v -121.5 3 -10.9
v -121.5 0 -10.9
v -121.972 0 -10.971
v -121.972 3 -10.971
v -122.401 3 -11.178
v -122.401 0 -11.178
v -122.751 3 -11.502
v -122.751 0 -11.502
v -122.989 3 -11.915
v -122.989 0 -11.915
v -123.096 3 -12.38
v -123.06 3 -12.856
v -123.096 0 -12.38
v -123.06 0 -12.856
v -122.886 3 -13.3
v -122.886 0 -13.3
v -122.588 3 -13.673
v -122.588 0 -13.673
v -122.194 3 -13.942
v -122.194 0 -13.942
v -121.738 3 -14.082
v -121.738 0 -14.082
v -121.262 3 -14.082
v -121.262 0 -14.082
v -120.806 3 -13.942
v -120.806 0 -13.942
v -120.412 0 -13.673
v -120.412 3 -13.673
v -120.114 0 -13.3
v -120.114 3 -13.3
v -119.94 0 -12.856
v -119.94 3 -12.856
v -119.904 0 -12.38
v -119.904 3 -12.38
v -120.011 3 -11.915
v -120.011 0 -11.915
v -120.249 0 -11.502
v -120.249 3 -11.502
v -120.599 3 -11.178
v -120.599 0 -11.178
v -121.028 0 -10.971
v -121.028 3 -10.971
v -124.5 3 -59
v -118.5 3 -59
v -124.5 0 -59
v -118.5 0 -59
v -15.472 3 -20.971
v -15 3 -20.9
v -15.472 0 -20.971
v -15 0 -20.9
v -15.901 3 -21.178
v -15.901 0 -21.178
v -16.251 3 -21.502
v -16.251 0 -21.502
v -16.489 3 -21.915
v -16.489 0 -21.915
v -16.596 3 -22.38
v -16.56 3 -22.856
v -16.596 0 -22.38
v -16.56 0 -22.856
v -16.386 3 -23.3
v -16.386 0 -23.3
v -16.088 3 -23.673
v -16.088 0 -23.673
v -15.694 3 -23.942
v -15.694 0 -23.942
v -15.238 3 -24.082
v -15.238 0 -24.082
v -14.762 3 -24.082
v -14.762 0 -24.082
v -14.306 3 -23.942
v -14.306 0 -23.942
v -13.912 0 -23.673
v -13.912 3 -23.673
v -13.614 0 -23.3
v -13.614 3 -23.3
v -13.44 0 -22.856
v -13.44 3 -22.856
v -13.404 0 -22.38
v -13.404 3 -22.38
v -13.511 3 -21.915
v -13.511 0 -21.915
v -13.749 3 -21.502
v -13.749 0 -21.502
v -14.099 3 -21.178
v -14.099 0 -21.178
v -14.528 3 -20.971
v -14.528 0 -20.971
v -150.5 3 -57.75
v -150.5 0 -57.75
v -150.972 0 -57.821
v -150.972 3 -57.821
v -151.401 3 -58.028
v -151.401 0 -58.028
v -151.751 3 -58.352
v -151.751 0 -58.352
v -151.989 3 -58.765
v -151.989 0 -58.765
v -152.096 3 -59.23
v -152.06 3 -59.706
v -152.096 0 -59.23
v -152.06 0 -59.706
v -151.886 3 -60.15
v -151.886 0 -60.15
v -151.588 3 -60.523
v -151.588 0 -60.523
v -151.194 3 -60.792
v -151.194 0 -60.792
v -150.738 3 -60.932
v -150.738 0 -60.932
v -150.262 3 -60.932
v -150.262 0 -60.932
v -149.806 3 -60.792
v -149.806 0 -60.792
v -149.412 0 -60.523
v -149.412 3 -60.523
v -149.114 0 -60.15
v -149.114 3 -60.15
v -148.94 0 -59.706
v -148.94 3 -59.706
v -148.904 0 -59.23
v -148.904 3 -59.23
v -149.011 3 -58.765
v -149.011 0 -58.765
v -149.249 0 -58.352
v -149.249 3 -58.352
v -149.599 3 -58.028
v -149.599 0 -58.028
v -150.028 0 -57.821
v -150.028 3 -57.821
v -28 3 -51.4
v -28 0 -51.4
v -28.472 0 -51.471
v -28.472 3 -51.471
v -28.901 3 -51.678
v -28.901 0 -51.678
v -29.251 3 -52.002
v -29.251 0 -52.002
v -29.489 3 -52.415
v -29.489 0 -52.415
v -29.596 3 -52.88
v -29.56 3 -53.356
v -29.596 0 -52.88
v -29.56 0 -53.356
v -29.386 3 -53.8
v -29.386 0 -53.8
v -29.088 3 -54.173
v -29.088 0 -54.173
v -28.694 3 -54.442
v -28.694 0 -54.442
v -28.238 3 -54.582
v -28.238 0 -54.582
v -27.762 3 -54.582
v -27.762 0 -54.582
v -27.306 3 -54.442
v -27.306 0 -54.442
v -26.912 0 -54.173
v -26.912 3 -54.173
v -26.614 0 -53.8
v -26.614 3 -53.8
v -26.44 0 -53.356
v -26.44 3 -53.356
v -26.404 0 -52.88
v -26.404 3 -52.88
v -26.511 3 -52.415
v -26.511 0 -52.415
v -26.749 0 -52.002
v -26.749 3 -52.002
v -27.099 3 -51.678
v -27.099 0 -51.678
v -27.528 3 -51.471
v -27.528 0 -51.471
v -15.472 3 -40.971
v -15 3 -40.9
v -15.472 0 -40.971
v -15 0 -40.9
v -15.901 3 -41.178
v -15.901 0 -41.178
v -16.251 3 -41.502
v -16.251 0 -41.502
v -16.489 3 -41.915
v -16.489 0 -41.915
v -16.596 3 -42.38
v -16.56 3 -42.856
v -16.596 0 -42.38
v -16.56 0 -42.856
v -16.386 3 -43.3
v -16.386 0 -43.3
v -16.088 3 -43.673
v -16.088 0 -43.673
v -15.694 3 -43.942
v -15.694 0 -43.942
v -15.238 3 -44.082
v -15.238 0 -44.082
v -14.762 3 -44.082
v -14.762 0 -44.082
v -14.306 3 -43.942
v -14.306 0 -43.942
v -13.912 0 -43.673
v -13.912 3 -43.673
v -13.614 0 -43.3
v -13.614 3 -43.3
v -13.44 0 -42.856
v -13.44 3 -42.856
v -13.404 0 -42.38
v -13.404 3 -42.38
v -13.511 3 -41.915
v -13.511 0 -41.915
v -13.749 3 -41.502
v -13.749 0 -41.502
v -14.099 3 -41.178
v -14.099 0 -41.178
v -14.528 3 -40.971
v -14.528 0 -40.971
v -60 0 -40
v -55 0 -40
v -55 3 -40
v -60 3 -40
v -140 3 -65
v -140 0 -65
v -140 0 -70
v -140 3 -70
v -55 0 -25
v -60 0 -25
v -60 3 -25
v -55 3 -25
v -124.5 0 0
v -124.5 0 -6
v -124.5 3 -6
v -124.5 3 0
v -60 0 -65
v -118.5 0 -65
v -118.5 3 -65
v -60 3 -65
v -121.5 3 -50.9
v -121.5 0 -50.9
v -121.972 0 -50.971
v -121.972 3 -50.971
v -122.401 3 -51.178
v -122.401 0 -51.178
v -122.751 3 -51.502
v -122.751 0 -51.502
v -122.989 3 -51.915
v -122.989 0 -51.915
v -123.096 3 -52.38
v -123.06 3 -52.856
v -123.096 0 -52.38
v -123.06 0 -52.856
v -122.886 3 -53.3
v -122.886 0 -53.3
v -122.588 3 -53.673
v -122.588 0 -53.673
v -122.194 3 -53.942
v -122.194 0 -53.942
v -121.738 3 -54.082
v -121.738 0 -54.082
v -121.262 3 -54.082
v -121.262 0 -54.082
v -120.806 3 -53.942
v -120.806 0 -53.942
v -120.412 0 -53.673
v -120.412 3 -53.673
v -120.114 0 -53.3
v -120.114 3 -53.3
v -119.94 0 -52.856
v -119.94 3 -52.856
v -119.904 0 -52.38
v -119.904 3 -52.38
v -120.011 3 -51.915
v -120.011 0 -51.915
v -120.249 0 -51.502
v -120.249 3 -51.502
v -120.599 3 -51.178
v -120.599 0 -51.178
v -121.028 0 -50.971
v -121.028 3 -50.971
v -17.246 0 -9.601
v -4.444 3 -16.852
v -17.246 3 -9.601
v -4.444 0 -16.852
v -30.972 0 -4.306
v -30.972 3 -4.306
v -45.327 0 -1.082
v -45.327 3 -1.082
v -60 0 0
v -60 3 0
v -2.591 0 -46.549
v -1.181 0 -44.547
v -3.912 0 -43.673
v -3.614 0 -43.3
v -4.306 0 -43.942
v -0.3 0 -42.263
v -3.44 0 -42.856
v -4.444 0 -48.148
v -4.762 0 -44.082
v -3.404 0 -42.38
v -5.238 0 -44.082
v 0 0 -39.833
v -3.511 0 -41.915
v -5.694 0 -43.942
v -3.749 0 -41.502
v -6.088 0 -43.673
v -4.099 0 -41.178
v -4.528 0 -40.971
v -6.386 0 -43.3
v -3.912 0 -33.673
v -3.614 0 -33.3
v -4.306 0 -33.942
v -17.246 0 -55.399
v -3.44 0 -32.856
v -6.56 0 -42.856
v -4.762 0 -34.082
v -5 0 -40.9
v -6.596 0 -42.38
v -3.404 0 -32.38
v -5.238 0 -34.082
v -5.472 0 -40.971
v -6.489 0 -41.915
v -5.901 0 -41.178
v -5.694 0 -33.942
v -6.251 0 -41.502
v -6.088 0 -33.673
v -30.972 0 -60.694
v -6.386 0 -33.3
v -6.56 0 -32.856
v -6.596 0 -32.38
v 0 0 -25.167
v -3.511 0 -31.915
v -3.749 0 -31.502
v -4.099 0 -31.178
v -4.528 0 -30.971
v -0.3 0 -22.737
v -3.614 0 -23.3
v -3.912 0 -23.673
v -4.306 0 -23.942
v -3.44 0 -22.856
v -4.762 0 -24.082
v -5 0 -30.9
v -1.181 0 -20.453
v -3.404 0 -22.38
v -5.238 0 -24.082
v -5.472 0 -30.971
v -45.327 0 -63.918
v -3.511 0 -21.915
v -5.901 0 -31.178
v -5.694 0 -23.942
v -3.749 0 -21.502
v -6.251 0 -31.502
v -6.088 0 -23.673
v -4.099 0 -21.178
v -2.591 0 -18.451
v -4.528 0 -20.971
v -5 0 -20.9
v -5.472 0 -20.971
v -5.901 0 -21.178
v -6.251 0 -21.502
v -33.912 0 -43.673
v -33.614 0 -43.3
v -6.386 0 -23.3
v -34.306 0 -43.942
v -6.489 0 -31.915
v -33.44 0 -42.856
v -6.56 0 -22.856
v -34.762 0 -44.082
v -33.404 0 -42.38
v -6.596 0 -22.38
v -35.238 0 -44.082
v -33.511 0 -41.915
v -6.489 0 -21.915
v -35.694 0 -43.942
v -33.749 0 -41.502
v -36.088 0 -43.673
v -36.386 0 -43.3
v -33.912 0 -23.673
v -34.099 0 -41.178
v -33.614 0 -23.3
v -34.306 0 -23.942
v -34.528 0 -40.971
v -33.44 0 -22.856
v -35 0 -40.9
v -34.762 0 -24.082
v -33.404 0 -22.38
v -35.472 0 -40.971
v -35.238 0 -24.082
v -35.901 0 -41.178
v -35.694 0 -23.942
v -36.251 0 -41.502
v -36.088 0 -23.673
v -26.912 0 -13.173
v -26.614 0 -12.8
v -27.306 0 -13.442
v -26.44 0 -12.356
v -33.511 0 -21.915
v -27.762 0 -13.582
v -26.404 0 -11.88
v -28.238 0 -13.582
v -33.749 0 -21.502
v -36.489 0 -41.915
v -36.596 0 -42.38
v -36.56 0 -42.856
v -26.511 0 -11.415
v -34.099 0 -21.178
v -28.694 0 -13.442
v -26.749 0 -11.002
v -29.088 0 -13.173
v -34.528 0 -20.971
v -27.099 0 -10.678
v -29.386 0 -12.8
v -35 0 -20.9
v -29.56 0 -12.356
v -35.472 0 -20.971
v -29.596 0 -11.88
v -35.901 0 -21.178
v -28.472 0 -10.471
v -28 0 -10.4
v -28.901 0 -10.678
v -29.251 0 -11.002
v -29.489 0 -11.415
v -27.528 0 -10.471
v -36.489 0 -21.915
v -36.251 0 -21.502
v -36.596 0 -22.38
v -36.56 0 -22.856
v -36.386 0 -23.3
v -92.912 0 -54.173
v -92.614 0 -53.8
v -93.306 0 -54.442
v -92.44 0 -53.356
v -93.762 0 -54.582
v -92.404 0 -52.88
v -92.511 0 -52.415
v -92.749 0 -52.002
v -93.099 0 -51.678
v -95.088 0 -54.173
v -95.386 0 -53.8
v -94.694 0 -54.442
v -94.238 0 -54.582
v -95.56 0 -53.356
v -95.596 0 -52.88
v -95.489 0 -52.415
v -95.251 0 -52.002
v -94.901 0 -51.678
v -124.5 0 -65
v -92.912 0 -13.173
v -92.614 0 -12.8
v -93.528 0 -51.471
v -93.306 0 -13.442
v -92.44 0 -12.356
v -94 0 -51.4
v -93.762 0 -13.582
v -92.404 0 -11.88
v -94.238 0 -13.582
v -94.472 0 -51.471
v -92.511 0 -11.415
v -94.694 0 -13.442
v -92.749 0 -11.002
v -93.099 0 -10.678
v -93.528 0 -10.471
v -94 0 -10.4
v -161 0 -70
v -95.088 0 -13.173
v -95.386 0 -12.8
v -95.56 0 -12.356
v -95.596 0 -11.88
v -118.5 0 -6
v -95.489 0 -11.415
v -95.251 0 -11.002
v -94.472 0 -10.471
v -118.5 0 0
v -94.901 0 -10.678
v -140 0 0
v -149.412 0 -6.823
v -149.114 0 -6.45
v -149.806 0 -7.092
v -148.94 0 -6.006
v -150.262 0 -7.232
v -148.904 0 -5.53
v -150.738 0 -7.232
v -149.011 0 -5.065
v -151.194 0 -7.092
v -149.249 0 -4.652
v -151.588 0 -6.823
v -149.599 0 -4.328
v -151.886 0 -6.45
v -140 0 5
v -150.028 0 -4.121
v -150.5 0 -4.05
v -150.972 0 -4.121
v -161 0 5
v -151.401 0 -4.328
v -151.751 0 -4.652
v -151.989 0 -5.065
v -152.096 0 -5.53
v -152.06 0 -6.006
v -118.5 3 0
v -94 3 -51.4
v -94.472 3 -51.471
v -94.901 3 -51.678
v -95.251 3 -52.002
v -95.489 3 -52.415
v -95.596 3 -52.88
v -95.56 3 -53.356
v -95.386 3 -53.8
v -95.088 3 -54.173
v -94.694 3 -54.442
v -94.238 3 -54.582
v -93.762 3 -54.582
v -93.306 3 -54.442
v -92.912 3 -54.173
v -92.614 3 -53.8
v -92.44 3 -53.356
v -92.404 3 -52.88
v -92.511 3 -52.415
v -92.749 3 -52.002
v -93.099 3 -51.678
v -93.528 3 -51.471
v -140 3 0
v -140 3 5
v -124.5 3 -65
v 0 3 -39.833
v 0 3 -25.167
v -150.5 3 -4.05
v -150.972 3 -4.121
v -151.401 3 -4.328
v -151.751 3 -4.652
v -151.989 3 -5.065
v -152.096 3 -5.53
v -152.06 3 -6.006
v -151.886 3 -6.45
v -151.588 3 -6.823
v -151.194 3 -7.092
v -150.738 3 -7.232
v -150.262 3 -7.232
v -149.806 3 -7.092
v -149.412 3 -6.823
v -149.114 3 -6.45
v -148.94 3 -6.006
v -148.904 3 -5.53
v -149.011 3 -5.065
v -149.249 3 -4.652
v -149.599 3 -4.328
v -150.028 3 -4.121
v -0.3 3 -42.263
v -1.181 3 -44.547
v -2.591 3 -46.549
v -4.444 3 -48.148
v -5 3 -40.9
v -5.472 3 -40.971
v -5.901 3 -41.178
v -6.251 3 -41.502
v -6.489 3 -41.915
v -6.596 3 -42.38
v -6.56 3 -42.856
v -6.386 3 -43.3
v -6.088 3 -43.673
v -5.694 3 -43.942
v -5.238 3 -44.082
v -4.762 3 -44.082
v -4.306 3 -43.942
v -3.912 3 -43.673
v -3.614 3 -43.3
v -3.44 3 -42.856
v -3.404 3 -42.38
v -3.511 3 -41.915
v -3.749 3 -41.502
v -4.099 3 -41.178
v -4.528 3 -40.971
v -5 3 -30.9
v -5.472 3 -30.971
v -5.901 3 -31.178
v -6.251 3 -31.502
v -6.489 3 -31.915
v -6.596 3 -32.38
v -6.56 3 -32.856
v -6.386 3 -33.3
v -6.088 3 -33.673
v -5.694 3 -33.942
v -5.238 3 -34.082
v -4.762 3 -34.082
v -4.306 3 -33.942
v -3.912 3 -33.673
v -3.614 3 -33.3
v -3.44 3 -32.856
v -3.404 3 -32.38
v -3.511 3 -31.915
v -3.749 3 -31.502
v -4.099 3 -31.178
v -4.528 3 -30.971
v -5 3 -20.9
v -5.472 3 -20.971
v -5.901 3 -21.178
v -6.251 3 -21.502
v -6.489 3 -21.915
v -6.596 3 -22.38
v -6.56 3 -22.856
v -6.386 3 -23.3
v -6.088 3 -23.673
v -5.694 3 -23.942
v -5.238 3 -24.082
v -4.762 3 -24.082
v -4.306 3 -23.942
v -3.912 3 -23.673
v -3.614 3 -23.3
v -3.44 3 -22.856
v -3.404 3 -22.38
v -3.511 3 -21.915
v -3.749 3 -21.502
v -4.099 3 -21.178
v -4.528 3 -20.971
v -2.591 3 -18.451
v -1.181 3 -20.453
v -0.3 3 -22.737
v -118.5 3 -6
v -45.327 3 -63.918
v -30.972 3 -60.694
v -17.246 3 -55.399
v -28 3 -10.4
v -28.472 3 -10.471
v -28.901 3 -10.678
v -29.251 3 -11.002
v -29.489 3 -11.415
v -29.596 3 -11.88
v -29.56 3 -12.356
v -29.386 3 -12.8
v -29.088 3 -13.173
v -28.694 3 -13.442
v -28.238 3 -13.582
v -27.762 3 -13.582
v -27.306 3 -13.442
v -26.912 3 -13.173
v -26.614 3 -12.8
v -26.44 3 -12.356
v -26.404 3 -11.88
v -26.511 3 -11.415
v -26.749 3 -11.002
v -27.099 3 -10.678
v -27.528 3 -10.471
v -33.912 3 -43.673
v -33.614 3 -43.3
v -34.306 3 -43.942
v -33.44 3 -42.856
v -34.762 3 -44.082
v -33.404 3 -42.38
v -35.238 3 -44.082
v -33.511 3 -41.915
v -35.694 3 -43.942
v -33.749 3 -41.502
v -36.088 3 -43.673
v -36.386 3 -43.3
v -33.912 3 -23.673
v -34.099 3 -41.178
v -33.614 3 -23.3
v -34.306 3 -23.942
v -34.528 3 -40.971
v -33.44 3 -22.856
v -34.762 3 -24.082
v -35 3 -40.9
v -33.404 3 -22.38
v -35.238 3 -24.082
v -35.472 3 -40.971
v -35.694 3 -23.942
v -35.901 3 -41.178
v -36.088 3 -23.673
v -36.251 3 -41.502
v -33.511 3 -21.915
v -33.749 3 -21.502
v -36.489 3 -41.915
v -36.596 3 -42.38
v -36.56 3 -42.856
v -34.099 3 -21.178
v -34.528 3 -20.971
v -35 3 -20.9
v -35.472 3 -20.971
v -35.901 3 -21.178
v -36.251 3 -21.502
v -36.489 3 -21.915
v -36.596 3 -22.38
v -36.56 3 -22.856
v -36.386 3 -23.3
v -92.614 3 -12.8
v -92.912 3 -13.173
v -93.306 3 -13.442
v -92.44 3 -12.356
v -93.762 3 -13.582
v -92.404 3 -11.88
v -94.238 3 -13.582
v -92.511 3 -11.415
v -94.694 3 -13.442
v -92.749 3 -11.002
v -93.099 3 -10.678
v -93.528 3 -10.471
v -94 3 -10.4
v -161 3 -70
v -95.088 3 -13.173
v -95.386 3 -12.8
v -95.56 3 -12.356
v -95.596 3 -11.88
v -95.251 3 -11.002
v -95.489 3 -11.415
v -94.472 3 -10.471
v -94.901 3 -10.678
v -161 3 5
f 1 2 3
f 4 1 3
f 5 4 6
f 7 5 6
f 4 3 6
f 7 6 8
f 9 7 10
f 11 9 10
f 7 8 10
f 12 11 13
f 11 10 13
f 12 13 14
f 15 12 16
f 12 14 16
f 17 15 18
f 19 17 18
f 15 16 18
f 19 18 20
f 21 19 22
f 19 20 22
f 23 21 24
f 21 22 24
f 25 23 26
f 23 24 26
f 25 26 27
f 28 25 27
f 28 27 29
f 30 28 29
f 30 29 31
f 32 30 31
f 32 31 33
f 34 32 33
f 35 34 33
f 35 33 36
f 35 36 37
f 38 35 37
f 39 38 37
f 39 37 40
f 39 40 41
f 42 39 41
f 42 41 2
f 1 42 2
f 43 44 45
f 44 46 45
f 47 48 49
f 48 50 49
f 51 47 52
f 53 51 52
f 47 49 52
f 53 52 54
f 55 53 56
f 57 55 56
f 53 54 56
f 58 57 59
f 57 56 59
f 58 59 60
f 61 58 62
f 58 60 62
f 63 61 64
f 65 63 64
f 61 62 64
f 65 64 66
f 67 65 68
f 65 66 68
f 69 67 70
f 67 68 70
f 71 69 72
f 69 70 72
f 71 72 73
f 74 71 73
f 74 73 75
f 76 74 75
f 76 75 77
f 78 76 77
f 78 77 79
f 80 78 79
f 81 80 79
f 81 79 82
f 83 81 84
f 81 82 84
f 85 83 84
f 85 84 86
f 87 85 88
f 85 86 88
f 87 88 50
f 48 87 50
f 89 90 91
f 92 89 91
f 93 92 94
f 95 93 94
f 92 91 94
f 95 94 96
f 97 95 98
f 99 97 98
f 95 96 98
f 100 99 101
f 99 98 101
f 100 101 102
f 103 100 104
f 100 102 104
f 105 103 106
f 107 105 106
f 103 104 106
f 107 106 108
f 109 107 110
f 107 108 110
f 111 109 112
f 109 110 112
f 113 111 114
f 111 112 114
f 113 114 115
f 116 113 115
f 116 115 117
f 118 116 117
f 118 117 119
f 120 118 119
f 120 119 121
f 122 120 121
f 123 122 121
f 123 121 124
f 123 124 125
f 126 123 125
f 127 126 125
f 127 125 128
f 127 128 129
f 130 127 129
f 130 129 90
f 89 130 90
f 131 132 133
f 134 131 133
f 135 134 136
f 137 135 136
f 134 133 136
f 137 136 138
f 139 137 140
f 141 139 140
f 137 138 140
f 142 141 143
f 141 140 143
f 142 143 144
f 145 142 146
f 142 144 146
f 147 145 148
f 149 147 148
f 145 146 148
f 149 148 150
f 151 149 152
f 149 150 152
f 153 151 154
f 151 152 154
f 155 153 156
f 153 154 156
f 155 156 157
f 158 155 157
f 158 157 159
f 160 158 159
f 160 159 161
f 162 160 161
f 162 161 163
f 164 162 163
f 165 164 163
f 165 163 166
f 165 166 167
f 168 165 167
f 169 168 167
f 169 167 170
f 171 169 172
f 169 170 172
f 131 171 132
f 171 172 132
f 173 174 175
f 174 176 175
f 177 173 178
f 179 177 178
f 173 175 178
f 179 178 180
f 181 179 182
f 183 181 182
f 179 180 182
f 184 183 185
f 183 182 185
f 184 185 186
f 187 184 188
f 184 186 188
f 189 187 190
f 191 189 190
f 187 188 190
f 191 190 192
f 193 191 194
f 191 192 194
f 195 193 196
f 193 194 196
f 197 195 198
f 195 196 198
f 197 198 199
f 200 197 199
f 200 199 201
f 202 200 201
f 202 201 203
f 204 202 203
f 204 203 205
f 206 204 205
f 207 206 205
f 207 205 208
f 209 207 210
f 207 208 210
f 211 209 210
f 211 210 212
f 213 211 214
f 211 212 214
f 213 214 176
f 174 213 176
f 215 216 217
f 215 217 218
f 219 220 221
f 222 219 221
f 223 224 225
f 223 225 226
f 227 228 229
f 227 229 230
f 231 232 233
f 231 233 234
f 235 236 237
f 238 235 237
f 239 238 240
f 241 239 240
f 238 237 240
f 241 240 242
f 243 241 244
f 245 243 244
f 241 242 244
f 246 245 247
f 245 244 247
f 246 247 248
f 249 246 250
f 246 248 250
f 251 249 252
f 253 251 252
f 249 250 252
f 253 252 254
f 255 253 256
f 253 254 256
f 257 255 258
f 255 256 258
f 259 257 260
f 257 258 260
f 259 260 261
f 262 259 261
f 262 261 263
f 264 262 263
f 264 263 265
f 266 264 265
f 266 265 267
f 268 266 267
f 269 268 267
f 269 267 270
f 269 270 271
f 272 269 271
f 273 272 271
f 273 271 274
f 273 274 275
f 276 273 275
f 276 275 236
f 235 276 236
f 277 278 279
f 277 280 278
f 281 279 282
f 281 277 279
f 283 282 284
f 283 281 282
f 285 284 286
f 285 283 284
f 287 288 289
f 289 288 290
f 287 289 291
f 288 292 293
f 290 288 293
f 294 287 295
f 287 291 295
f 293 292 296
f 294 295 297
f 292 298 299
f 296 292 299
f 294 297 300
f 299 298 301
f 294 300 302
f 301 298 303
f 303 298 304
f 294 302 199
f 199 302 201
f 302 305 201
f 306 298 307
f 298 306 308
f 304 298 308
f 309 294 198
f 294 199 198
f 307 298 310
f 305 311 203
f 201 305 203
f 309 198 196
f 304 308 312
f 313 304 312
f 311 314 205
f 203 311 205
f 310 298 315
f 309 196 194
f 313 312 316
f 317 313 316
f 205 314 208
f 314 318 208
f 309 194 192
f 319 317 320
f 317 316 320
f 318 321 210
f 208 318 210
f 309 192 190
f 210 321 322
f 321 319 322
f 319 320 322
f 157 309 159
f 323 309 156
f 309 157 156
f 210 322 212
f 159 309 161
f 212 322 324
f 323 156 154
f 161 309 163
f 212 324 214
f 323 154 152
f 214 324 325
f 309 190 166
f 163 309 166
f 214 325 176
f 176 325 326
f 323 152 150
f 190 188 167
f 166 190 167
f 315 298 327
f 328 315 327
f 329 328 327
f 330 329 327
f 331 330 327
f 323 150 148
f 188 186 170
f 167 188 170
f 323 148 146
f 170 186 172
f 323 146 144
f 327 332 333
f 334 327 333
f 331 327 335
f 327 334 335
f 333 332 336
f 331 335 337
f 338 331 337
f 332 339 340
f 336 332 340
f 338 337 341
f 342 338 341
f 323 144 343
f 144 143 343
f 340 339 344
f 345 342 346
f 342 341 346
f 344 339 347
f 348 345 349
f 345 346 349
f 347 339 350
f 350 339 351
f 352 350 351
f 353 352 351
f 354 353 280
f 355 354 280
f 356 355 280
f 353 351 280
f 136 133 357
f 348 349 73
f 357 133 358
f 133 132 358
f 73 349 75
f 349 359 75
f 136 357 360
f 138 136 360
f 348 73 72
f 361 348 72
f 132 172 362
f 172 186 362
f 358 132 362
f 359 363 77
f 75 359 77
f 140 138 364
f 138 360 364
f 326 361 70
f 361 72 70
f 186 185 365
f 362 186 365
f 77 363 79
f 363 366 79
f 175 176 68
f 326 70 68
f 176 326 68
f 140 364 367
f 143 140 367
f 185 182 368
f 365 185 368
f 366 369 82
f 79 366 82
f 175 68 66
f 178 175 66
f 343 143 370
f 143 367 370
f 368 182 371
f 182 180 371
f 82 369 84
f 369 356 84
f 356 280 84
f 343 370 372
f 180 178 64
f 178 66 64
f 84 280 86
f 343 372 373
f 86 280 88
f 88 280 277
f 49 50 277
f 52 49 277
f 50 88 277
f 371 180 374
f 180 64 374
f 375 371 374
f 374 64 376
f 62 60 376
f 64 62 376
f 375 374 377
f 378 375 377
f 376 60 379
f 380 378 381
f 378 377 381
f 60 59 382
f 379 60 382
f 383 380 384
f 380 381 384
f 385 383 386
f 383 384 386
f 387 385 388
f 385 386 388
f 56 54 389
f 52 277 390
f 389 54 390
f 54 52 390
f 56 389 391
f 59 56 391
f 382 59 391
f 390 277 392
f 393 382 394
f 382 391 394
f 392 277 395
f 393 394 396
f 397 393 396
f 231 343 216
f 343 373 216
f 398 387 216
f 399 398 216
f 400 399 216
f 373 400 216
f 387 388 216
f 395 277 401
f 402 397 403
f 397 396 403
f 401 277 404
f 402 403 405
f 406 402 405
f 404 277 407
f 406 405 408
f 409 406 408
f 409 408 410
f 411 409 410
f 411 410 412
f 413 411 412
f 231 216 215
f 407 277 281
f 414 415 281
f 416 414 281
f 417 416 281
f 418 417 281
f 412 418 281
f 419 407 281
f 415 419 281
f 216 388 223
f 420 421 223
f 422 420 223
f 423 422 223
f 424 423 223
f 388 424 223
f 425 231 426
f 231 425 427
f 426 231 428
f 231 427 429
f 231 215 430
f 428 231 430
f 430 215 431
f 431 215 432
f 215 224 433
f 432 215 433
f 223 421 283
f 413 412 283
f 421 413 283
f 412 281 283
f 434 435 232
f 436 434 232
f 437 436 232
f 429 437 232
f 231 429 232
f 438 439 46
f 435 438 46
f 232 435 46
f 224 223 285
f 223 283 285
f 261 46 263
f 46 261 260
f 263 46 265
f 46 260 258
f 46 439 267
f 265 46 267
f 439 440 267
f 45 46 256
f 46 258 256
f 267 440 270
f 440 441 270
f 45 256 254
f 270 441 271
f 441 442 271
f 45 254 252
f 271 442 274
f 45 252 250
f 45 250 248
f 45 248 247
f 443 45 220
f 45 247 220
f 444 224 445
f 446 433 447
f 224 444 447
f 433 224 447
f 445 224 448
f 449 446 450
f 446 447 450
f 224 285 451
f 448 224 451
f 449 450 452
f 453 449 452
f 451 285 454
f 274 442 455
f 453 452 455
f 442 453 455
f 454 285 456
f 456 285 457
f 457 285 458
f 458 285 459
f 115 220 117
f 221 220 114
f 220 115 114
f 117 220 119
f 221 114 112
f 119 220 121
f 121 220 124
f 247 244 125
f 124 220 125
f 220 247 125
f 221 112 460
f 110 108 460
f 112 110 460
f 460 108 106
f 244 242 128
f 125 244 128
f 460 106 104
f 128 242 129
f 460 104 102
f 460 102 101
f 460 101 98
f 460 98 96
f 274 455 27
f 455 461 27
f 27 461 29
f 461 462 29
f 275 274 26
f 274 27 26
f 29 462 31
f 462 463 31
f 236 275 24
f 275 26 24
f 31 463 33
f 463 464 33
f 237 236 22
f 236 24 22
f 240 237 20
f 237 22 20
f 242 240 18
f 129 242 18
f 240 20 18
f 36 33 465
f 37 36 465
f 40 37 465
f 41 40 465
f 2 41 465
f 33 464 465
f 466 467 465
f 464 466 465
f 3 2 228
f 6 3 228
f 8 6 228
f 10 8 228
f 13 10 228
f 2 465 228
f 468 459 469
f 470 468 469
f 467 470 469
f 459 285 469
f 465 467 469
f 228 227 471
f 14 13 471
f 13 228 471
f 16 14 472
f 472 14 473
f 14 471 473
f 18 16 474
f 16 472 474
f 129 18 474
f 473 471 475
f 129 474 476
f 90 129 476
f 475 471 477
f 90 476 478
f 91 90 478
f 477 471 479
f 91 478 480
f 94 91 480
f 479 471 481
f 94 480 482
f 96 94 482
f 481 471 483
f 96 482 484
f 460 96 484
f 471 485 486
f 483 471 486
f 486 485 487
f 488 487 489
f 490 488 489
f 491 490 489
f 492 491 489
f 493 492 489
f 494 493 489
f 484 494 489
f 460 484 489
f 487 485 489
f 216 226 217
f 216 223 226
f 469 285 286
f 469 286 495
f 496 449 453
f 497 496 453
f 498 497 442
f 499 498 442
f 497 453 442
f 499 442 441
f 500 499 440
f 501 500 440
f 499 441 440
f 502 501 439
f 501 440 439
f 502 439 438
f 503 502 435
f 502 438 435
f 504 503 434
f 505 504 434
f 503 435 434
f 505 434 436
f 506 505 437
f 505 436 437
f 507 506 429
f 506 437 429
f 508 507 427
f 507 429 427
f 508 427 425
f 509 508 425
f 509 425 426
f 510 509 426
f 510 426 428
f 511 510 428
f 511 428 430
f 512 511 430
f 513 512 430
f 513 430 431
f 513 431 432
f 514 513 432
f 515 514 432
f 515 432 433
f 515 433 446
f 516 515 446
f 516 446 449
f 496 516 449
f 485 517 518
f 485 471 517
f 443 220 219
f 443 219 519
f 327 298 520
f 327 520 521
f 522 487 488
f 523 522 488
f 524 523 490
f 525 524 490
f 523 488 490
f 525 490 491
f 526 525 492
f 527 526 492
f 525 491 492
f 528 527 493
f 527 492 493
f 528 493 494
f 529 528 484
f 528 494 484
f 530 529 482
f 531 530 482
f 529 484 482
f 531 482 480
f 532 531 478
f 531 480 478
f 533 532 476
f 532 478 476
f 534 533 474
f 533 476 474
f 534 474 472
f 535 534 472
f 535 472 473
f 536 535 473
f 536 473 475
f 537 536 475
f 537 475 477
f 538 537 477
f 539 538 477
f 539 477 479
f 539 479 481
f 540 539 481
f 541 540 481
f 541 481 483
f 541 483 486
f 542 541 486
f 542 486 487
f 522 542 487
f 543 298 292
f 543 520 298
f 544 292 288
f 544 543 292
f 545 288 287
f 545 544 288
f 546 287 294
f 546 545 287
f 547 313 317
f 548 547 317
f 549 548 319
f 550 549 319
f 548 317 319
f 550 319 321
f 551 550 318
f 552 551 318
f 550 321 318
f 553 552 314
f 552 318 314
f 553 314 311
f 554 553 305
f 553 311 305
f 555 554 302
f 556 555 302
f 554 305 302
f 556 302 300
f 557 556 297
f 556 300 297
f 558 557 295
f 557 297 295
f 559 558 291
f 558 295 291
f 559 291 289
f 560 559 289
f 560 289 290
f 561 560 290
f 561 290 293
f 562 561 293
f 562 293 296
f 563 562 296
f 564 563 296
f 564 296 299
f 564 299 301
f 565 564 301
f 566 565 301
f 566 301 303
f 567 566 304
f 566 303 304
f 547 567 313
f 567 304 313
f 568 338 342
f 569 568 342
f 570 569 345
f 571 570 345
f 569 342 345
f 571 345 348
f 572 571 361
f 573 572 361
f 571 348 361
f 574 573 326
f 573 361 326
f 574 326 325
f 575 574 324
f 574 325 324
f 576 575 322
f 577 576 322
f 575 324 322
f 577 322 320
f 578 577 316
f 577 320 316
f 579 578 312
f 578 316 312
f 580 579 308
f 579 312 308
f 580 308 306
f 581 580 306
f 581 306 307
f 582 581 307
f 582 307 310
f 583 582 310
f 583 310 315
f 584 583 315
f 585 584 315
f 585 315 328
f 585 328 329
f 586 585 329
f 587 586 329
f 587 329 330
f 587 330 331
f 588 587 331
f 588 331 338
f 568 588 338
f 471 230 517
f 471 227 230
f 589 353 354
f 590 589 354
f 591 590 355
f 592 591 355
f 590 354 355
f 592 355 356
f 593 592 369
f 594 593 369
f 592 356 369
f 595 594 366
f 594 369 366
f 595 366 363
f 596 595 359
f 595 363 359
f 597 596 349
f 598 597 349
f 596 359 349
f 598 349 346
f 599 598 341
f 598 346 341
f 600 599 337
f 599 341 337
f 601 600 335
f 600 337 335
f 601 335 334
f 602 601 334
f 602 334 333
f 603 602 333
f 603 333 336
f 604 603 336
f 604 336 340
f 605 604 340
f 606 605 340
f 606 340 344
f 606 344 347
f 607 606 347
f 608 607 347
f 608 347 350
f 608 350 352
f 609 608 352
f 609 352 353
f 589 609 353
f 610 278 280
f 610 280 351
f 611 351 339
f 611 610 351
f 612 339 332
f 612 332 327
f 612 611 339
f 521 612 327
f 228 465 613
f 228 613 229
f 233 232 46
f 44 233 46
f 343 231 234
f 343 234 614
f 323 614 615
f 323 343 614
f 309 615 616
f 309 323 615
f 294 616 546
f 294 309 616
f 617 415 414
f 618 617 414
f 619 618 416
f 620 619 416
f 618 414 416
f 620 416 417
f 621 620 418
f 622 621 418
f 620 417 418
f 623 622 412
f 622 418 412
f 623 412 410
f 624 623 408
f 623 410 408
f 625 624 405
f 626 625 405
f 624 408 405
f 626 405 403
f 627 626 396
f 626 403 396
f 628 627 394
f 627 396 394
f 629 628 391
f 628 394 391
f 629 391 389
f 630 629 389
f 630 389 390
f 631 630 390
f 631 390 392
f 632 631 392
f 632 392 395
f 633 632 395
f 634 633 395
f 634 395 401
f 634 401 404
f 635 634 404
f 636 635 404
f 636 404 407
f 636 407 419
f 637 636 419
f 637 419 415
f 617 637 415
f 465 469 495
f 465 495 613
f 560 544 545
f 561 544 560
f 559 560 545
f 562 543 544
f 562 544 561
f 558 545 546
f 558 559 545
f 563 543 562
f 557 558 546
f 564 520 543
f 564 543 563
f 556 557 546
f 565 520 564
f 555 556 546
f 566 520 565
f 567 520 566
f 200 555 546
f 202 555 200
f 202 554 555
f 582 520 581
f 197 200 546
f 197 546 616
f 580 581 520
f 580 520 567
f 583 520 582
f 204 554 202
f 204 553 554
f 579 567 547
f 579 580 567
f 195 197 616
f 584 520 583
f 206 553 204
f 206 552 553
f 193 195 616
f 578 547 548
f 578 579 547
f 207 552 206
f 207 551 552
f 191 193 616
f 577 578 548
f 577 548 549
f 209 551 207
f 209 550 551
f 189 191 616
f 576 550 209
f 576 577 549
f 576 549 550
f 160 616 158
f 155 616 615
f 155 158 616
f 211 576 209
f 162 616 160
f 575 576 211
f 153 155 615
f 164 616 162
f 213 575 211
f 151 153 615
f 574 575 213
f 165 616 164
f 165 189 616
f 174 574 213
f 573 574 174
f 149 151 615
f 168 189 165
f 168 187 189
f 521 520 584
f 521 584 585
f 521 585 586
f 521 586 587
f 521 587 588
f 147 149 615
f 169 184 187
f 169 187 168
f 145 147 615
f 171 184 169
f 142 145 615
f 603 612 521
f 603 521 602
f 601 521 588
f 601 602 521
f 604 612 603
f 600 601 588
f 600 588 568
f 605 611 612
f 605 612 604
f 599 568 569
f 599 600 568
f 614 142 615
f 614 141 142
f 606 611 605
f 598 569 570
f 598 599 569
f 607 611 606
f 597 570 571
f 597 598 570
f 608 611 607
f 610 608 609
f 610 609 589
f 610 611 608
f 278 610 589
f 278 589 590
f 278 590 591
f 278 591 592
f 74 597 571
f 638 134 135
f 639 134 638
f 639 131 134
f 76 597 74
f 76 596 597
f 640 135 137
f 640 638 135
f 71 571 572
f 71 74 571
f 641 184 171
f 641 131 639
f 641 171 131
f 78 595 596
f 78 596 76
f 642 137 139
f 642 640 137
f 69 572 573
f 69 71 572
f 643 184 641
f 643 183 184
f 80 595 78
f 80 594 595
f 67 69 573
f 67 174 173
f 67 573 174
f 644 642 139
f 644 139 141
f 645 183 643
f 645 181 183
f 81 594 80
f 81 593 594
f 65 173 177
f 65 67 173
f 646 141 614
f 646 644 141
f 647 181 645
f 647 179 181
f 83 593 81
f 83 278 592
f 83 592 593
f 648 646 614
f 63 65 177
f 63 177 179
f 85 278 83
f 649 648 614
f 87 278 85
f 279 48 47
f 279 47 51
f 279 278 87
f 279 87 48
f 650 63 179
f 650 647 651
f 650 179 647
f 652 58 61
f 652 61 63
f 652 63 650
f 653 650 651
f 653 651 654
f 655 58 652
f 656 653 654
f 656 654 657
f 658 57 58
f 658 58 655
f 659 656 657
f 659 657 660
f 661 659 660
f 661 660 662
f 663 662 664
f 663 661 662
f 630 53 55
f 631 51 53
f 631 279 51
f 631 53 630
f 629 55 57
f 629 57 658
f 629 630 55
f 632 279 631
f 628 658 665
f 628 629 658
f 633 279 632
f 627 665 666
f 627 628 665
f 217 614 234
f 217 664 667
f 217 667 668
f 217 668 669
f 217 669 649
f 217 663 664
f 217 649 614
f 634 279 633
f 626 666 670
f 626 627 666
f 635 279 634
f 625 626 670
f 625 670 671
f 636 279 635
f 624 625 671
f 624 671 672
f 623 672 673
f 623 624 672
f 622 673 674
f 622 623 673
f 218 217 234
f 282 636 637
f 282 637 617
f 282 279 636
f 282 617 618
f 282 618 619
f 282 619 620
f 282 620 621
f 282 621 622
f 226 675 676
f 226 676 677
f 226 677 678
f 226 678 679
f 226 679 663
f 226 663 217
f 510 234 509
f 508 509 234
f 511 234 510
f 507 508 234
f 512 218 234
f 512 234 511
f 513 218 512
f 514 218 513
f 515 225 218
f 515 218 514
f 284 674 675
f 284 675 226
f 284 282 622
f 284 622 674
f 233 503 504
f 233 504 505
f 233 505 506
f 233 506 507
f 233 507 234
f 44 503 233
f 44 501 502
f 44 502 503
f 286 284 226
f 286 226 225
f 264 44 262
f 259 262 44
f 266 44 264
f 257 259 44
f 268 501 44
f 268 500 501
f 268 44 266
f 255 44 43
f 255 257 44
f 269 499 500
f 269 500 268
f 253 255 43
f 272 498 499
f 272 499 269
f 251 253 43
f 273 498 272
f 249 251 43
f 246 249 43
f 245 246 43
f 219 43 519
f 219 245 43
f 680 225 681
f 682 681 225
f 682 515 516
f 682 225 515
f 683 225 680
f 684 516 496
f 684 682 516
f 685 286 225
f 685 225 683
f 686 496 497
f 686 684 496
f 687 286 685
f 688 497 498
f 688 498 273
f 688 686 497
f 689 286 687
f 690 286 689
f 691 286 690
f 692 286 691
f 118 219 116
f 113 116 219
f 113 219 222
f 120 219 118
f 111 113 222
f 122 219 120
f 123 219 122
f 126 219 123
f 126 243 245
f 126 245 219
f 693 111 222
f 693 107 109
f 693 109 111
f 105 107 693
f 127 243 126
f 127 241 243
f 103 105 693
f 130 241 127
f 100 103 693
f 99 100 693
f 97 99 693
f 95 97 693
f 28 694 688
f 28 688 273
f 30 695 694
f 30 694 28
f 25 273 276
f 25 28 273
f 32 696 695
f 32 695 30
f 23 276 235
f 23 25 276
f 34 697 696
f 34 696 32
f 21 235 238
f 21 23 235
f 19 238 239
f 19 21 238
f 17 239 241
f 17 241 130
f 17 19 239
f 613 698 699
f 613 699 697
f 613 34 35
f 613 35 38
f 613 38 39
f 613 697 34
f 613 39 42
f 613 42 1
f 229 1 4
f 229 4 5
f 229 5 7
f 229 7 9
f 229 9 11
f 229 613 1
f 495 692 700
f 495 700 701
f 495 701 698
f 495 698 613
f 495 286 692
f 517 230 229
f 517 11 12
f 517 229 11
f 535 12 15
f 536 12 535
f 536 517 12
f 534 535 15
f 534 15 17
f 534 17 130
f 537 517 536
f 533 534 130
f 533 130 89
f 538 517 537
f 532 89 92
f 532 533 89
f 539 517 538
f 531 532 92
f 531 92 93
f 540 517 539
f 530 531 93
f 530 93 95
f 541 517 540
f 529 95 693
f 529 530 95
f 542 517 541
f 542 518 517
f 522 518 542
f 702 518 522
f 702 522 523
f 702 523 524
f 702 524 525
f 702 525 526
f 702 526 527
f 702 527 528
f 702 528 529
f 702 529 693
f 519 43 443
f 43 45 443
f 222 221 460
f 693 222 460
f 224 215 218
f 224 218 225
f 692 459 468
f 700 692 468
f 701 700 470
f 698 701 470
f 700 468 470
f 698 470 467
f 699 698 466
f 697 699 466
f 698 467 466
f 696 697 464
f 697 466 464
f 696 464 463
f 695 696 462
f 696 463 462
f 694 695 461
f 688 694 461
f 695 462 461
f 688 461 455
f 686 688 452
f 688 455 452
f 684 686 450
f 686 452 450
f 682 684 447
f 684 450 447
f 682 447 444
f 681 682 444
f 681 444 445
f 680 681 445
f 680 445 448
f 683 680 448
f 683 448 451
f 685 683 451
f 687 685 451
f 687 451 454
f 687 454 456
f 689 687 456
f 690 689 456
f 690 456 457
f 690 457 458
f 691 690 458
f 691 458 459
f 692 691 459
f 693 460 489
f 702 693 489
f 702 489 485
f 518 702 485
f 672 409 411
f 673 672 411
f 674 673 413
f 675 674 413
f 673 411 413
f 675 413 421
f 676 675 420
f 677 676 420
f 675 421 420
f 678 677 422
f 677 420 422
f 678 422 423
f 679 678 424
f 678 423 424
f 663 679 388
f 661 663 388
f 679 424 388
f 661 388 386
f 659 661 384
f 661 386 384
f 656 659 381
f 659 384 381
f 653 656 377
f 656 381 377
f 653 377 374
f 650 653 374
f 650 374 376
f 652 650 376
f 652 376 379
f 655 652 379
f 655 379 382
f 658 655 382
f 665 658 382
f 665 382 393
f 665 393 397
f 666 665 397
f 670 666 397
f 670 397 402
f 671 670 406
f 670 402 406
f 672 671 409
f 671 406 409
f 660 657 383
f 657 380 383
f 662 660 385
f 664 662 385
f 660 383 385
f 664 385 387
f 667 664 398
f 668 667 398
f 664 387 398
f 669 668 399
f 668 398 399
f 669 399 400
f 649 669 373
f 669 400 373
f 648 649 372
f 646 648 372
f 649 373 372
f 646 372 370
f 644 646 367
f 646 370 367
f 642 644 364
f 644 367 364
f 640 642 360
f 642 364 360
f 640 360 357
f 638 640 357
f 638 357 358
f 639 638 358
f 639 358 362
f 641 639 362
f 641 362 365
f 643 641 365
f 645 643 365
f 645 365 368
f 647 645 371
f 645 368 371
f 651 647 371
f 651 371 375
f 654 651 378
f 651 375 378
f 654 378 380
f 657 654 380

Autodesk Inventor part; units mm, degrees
ref_plane "YZ Plane" through (0, 0, 0) normal (1, 0, 0) x (0, 1, 0)
ref_plane "XZ Plane" through (0, 0, 0) normal (0, 1, 0) x (-1, 0, 0)
ref_plane "XY Plane" through (0, 0, 0) normal (0, 0, 1) x (1, 0, 0)
sketch "スケッチ1" plane through (0, 0, 0) normal (0, 1, 0) x (-1, 0, 0)
  line L0 (0, 0) -> (140, 0)
  line L1 (140, -65) -> (0, -65)
  line L2 (0, -65) -> (0, 0)
  line L3 (124.5, 0) -> (118.5, 0)
  line L4 (118.5, 0) -> (118.5, -6)
  line L5 (118.5, -6) -> (124.5, -6)
  line L6 (124.5, -6) -> (124.5, 0)
  line L7 (124.5, -65) -> (118.5, -65)
  line L8 (118.5, -65) -> (118.5, -59)
  line L9 (118.5, -59) -> (124.5, -59)
  line L10 (124.5, -59) -> (124.5, -65)
  line L11 (0, -45) -> (25, -65)
  line L12 (0, -20) -> (25, 0)
  line L13 (60, -25) -> (55, -25)
  line L14 (55, -25) -> (55, -40)
  line L15 (55, -40) -> (60, -40)
  line L16 (60, -40) -> (60, -25)
  line L17 (140, -70) -> (161, -70)
  line L18 (161, -70) -> (161, 5)
  line L19 (161, 5) -> (140, 5)
  line L20 (140, -65) -> (140, -70)
  line L21 (140, 0) -> (140, 5)
  point P0 (124.5, -3)
  point P1 (124.5, -62)
  point P2 (118.5, 0)
  dimension "d0" = 140
  dimension "d1" = 65
  dimension "d61" = 6
  dimension "d62" = 6
  dimension "d63" = 6
  dimension "d64" = 6
  dimension "d66" = 20
  dimension "d67" = 20
  dimension "d68" = 25
  dimension "d70" = 5
  dimension "d71" = 15
  dimension "d73" = 25
  dimension "d103" = 21
  dimension "d104" = 75
  dimension "d105" = 5
extrude "押し出し1" add sketch "スケッチ1" along normal blind 3 contours L0 L4 L5 L6 L21 L19 L18 L17 L20 L1 L10 L9 L8 L11 L2 L12
sketch "スケッチ2" plane through (0, 3, 0) normal (0, 1, 0) x (1, 0, 0)
  line L0 (-140, 0) -> (0, 0) projected
  line L1 (-25, 65) -> (-140, 65) projected
  line L2 (-140, 65) -> (-140, 70) projected
  point P0 (-121.5, 12.5)
  point P1 (0, 65)
  point P2 (-121.5, 52.5)
  dimension "d9" = 12.5
  dimension "d55" = 12.5
  dimension "d69" = 40
  dimension "d107" = 18.5
hole "穴1" at (-121.5, 3, -12.5) at (-121.5, 3, -52.5) direction (0, -1, 0) diameter 3.2 end through all
sketch "スケッチ3" plane through (0, 3, 0) normal (0, 1, 0) x (1, 0, 0)
  line L0 (-140, 0) -> (0, 0) projected
  line L1 (-25, 65) -> (-140, 65) projected
  line L2 (0, 0) -> (0, 45) projected
  point P0 (-35, 22.5)
  point P1 (-35, 42.5)
  point P2 (-15, 42.5)
  point P3 (-15, 22.5)
  point P4 (0, 65)
  dimension "d20" = 20
  dimension "d21" = 20
  dimension "d22" = 22.5
  dimension "d24" = 15
hole "穴2" at (-35, 3, -22.5) at (-35, 3, -42.5) at (-15, 3, -42.5) at (-15, 3, -22.5) direction (0, -1, 0) diameter 3.2 end through all
sketch "スケッチ4" plane through (0, 3, 0) normal (0, 1, 0) x (1, 0, 0)
  line L0 (-25, 65) -> (-140, 65) projected
  line L1 (0, 0) -> (0, 45) projected
  point P0 (-5, 42.5)
  point P1 (-5, 32.5)
  point P2 (-5, 22.5)
  point P3 (0, 65)
  dimension "d32" = 10
  dimension "d33" = 10
  dimension "d34" = 32.5
  dimension "d35" = 5
hole "穴3" at (-5, 3, -42.5) at (-5, 3, -32.5) at (-5, 3, -22.5) direction (0, -1, 0) diameter 3.2 end through all
sketch "スケッチ5" plane through (0, 3, 0) normal (0, 1, 0) x (1, 0, 0)
  line L0 (-25, 65) -> (-140, 65) projected
  line L1 (-140, 65) -> (-140, 0) projected
  line L2 (-140, 65) -> (-140, 70) projected
  point P0 (0, 0)
  point P1 (-94, 53)
  point P2 (-28, 53)
  point P3 (-28, 12)
  point P4 (-94, 12)
  point P5 (0, 65)
  dimension "d43" = 66
  dimension "d44" = 41
  dimension "d46" = 12
  dimension "d106" = 46
hole "穴4" at (-94, 3, -53) at (-28, 3, -53) at (-28, 3, -12) at (-94, 3, -12) direction (0, -1, 0) diameter 3.2 end through all
sketch "スケッチ8" plane through (0, 3, 0) normal (0, 1, 0) x (1, 0, 0)
  line L0 (-140, 70) -> (-161, 70) projected
  line L1 (-161, 70) -> (-161, -5) projected
  point P0 (0, 0)
  point P1 (-150.5, 59.35)
  point P2 (-150.5, 5.65)
  dimension "d108" = 10.65
  dimension "d109" = 10.5
  dimension "d110" = 53.7
hole "穴5" at (-150.5, 3, -59.35) at (-150.5, 3, -5.65) direction (0, -1, 0) diameter 3.2 end through all
sketch "スケッチ7" plane through (0, 3, 0) normal (0, 1, 0) x (1, 0, 0)
  line L0 (-140, 65) -> (-124.5, 65)
  line L1 (-124.5, 59) -> (-124.5, 65) projected
  line L2 (-124.5, 65) -> (-124.5, 59)
  line L3 (-118.5, 59) -> (-124.5, 59) projected
  line L4 (-124.5, 59) -> (-118.5, 59)
  line L5 (-118.5, 65) -> (-118.5, 59) projected
  line L6 (-118.5, 59) -> (-118.5, 65)
  line L7 (-118.5, 65) -> (-60.0781, 65)
  line L8 (0, 39.7809) -> (0, 25.2191)
  line L9 (-60.0781, 0) -> (-118.5, 0)
  line L10 (-118.5, 0) -> (-118.5, 6)
  line L11 (-118.5, 6) -> (-124.5, 6)
  line L12 (-124.5, 6) -> (-124.5, 0)
  line L13 (-124.5, 0) -> (-140, 0)
  circle A0 centre (-121.5, 52.5) radius 1.6
  circle A1 centre (-121.5, 12.5) radius 1.6
  line L14 (-60, 40) -> (-55, 40) projected
  line L15 (-55, 40) -> (-55, 25) projected
  line L16 (-60, 40) -> (-55, 40)
  line L17 (-55, 40) -> (-55, 25)
  line L18 (-55, 25) -> (-60, 25)
  line L19 (-60, 25) -> (-60, 40)
  circle A2 centre (-94, 53) radius 1.6
  circle A3 centre (-94, 12) radius 1.6
  circle A4 centre (-28, 53) radius 1.6
  circle A5 centre (-28, 12) radius 1.6
  circle A6 centre (-35, 42.5) radius 1.6
  circle A7 centre (-15, 42.5) radius 1.6
  circle A8 centre (-35, 22.5) radius 1.6
  circle A9 centre (-15, 22.5) radius 1.6
  circle A10 centre (-5, 42.5) radius 1.6
  circle A11 centre (-5, 32.5) radius 1.6
  circle A12 centre (-5, 22.5) radius 1.6
  line L20 (-140, 65) -> (-140, 70)
  line L21 (-140, 70) -> (-161, 70) projected
  line L22 (-140, 70) -> (-161, 70)
  line L23 (-161, 70) -> (-161, -5) projected
  line L24 (-161, 70) -> (-161, -5)
  line L25 (-161, -5) -> (-140, -5) projected
  line L26 (-161, -5) -> (-140, -5)
  line L27 (-140, -5) -> (-140, 0) projected
  line L28 (-140, -5) -> (-140, 0)
  circle A13 centre (-150.5, 59.35) radius 1.6 projected
  circle A14 centre (-150.5, 59.35) radius 1.6
  circle A15 centre (-150.5, 5.65) radius 1.6
  arc A16 (-60.0781, 0) -> (-4.4358, 16.9101) centre (-60.0781, 100) ccw
  arc A17 (-4.4358, 48.0899) -> (-60.0781, 65) centre (-60.0781, -35) ccw
  arc A18 (0, 39.7809) -> (-4.4358, 48.0899) centre (-10, 39.7809) ccw
  arc A19 (-4.4358, 16.9101) -> (0, 25.2191) centre (-10, 25.2191) ccw
  point P0 (0, 0)
  point P1 (-25, 65)
  point P2 (0, 45)
  point P3 (-25, 0)
  point P4 (0, 20)
  dimension "d74" = 3.2
  dimension "d75" = 3.2
  dimension "d77" = 40
  dimension "d79" = 3.2
  dimension "d80" = 3.2
  dimension "d81" = 3.2
  dimension "d82" = 3.2
  dimension "d83" = 41
  dimension "d86" = 66
  dimension "d87" = 3.2
  dimension "d88" = 3.2
  dimension "d89" = 3.2
  dimension "d90" = 3.2
  dimension "d91" = 20
  dimension "d92" = 20
  dimension "d94" = 15
  dimension "d95" = 3.2
  dimension "d96" = 3.2
  dimension "d97" = 3.2
  dimension "d98" = 10
  dimension "d99" = 10
  dimension "d100" = 5
  dimension "d118" = 18.5
  dimension "d119" = 46
  dimension "d121" = 161
  dimension "d123" = 3.2
  dimension "d124" = 3.2
  dimension "d125" = 10.5
  dimension "d126" = 10.65
  dimension "d127" = 53.7
  dimension "d129" = 6
  dimension "d133" = 100
  dimension "d134" = 10
  dimension "d138" = 32.5
  dimension "d139" = 22.5
  dimension "d140" = 12
  dimension "d141" = 16.9101
  dimension "d142" = 16.9101
fillet "フィレット1" radius 100 1 edges at (-25, 1.5, 0)
fillet "フィレット2" radius 100 1 edges at (-25, 1.5, -65)
fillet "フィレット3" radius 10 1 edges at (0, 1.5, -20)
fillet "フィレット4" radius 10 1 edges at (0, 1.5, -45)
properties material "アクリル"
